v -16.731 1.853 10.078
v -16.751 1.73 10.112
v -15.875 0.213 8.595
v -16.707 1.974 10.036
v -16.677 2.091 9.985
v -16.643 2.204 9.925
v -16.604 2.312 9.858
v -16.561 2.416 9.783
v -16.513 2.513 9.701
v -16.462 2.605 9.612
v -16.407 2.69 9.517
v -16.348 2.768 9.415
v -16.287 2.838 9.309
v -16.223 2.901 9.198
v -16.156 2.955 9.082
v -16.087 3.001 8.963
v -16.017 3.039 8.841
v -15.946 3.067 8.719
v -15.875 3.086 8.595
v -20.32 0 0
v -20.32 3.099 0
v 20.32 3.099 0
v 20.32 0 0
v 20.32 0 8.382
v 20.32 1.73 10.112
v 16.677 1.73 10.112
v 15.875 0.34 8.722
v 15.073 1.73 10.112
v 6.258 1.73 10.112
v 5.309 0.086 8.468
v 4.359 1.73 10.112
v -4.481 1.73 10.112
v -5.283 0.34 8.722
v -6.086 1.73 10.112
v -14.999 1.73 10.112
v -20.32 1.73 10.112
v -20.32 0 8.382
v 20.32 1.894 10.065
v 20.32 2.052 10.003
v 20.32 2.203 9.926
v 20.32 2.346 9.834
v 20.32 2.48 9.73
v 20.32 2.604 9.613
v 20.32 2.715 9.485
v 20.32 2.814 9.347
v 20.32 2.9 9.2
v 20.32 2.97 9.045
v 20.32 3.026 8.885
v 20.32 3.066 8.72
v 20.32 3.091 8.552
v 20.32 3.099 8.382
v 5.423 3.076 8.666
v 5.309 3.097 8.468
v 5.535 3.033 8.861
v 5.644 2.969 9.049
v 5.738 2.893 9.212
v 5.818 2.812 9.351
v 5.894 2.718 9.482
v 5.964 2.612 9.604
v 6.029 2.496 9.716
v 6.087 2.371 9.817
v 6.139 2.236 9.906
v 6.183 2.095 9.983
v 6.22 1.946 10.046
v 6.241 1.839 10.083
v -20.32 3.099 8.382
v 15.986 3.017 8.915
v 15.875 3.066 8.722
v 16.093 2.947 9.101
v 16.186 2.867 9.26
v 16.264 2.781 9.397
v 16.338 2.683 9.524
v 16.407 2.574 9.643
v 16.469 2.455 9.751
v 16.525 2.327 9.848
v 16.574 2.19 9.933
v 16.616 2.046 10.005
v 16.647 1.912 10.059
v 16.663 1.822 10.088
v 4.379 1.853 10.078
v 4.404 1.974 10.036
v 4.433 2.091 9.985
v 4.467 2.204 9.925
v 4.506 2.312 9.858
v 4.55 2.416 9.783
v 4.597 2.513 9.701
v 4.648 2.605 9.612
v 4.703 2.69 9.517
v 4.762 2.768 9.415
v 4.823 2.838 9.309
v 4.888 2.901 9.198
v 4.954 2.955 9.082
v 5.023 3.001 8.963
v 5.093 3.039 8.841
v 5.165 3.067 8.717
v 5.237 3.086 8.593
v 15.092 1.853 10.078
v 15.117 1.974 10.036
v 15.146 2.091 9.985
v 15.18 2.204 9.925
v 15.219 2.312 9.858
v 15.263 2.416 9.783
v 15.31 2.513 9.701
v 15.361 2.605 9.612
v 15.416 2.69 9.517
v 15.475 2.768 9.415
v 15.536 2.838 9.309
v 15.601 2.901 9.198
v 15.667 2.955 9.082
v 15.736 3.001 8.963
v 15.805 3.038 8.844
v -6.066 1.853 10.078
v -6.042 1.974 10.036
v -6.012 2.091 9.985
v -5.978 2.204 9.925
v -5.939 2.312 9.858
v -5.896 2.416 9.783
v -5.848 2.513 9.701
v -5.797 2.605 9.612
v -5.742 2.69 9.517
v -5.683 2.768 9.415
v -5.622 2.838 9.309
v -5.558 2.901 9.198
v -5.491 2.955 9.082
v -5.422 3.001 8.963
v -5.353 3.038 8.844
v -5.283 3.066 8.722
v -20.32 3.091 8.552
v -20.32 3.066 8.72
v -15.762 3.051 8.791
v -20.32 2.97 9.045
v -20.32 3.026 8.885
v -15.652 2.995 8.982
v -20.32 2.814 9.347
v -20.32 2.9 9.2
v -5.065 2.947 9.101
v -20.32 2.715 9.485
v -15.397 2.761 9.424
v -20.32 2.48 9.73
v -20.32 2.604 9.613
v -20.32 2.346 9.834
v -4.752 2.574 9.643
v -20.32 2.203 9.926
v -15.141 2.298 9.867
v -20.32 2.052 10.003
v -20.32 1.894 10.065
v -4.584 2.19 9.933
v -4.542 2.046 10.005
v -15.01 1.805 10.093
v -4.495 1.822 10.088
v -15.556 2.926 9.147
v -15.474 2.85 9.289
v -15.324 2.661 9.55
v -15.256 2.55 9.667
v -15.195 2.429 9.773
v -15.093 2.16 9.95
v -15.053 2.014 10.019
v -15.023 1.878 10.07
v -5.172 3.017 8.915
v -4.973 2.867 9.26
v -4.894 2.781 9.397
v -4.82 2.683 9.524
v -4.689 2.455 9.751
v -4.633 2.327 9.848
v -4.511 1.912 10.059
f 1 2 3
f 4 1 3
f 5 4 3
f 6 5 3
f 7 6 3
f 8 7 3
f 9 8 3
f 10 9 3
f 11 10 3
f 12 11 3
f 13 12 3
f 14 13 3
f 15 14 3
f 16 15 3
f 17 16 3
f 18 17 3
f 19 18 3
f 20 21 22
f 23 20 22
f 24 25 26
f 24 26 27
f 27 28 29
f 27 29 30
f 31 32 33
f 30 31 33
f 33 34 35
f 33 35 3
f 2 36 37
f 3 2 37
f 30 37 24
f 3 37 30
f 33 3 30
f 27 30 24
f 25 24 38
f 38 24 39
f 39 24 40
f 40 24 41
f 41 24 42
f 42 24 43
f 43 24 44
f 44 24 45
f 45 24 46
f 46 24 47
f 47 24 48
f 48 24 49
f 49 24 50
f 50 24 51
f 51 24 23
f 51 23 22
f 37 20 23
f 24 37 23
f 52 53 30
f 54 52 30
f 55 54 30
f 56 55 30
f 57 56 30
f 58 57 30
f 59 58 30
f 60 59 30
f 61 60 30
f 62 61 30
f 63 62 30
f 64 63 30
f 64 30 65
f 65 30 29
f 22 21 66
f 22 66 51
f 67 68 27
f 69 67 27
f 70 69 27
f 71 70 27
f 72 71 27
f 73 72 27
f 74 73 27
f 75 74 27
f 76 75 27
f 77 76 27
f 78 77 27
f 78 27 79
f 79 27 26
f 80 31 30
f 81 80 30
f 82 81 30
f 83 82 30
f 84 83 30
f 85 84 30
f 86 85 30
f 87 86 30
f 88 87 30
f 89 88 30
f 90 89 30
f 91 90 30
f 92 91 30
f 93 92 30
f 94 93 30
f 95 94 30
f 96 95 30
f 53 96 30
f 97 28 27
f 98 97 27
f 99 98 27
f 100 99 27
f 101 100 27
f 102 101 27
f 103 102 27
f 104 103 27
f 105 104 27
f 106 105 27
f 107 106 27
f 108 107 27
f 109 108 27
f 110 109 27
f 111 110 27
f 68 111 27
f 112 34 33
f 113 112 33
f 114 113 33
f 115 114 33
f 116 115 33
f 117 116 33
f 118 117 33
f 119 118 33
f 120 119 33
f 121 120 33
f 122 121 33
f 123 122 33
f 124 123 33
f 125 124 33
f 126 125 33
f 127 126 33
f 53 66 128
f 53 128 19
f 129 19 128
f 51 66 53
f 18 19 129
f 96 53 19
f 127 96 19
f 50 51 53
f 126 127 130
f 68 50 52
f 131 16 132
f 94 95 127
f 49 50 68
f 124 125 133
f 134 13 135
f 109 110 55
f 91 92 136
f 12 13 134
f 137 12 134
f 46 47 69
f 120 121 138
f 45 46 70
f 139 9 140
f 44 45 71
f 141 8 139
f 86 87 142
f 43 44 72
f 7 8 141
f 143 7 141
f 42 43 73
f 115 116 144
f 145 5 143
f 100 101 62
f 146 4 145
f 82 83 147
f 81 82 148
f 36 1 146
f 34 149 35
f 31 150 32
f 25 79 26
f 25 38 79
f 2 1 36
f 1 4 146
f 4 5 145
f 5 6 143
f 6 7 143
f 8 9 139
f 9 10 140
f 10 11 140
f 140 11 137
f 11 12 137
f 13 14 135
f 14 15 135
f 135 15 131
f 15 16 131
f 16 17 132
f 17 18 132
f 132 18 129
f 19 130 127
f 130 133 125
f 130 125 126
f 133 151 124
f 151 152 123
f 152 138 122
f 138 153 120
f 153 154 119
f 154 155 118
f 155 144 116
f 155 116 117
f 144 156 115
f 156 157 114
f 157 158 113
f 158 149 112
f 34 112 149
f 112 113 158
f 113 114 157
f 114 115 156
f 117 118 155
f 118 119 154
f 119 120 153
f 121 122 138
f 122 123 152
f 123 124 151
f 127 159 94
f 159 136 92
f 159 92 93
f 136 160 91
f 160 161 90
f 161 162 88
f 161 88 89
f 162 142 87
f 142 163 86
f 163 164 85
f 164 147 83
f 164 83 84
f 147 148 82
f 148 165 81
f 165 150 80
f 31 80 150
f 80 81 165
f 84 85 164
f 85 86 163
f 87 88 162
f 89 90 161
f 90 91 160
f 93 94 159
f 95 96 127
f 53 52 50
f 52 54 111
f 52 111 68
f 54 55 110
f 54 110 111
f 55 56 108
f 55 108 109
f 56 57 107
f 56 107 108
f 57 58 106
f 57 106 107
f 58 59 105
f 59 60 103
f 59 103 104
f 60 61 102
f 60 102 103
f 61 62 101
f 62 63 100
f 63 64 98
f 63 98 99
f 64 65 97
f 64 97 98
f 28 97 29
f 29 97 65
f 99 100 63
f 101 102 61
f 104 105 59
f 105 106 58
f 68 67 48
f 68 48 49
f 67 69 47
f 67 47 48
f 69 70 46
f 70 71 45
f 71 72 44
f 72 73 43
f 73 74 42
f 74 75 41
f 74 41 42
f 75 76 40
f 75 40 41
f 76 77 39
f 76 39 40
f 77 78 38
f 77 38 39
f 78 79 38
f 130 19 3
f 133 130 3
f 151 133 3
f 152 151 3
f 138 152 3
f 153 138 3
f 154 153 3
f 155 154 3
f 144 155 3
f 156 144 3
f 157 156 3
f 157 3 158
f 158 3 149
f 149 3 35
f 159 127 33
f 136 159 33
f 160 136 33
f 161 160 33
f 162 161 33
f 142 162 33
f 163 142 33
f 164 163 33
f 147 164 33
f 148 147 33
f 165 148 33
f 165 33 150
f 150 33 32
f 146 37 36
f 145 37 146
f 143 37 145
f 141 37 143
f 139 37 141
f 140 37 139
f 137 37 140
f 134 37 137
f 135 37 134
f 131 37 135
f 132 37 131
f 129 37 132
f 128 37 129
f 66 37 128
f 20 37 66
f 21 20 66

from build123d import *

# Parameters (mm, degrees)
F0_W        = 40.64
F0_H        = 3.0988
F1_DEPTH    = 10.16
F3_R        = 1.778
F4_T1_DEPTH = 49.7849047052
F5_DEPTH    = 25.4


# Not quite as in the source:
# - a fillet or chamfer that OpenCascade refuses, or shapes differently, is made with other operations: its cross-section is extruded or revolved along the edge and cut away or added


with BuildPart() as f1:
    # F0 (on Top) → F1 (new body)
    with BuildSketch(Plane.XY):
        with Locations((0, 1.5494)):
            Rectangle(F0_W, F0_H)
    extrude(amount=F1_DEPTH)

    # F3
    f3_edges = [f1.edges().sort_by_distance(p)[0] for p in [
        (0, 3.0988, 10.16),
    ]]
    fillet(f3_edges, radius=F3_R)

    # F4: chamfer of 1.778 on 1 edges, made by hand

    # F4_s2 → F4_t1 (cut)
    with BuildSketch(Plane.YZ.offset(-24.8924523526)):
        Polygon((1.778, 10.16), (0, 8.382), (0, 10.16), align=None)
    extrude(amount=F4_T1_DEPTH, mode=Mode.SUBTRACT)

    # F2 (on face) → F5 (cut)
    with BuildSketch(Plane.XZ):
        Polygon((-15.875, 8.5952954744), (-14.9716174209, 10.16), (-16.7783825791, 10.16), align=None)
        Polygon((-4.4531409051, 10.16), (-6.1132590949, 10.16), (-5.2832, 8.7222954744), align=None)
        Polygon((6.2853060633, 10.16), (4.3318939367, 10.16), (5.3086, 8.4682954744), align=None)
        Polygon((16.7050590949, 10.16), (15.0449409051, 10.16), (15.875, 8.7222954744), align=None)
    extrude(amount=-F5_DEPTH, mode=Mode.SUBTRACT)


solid = f1.part
